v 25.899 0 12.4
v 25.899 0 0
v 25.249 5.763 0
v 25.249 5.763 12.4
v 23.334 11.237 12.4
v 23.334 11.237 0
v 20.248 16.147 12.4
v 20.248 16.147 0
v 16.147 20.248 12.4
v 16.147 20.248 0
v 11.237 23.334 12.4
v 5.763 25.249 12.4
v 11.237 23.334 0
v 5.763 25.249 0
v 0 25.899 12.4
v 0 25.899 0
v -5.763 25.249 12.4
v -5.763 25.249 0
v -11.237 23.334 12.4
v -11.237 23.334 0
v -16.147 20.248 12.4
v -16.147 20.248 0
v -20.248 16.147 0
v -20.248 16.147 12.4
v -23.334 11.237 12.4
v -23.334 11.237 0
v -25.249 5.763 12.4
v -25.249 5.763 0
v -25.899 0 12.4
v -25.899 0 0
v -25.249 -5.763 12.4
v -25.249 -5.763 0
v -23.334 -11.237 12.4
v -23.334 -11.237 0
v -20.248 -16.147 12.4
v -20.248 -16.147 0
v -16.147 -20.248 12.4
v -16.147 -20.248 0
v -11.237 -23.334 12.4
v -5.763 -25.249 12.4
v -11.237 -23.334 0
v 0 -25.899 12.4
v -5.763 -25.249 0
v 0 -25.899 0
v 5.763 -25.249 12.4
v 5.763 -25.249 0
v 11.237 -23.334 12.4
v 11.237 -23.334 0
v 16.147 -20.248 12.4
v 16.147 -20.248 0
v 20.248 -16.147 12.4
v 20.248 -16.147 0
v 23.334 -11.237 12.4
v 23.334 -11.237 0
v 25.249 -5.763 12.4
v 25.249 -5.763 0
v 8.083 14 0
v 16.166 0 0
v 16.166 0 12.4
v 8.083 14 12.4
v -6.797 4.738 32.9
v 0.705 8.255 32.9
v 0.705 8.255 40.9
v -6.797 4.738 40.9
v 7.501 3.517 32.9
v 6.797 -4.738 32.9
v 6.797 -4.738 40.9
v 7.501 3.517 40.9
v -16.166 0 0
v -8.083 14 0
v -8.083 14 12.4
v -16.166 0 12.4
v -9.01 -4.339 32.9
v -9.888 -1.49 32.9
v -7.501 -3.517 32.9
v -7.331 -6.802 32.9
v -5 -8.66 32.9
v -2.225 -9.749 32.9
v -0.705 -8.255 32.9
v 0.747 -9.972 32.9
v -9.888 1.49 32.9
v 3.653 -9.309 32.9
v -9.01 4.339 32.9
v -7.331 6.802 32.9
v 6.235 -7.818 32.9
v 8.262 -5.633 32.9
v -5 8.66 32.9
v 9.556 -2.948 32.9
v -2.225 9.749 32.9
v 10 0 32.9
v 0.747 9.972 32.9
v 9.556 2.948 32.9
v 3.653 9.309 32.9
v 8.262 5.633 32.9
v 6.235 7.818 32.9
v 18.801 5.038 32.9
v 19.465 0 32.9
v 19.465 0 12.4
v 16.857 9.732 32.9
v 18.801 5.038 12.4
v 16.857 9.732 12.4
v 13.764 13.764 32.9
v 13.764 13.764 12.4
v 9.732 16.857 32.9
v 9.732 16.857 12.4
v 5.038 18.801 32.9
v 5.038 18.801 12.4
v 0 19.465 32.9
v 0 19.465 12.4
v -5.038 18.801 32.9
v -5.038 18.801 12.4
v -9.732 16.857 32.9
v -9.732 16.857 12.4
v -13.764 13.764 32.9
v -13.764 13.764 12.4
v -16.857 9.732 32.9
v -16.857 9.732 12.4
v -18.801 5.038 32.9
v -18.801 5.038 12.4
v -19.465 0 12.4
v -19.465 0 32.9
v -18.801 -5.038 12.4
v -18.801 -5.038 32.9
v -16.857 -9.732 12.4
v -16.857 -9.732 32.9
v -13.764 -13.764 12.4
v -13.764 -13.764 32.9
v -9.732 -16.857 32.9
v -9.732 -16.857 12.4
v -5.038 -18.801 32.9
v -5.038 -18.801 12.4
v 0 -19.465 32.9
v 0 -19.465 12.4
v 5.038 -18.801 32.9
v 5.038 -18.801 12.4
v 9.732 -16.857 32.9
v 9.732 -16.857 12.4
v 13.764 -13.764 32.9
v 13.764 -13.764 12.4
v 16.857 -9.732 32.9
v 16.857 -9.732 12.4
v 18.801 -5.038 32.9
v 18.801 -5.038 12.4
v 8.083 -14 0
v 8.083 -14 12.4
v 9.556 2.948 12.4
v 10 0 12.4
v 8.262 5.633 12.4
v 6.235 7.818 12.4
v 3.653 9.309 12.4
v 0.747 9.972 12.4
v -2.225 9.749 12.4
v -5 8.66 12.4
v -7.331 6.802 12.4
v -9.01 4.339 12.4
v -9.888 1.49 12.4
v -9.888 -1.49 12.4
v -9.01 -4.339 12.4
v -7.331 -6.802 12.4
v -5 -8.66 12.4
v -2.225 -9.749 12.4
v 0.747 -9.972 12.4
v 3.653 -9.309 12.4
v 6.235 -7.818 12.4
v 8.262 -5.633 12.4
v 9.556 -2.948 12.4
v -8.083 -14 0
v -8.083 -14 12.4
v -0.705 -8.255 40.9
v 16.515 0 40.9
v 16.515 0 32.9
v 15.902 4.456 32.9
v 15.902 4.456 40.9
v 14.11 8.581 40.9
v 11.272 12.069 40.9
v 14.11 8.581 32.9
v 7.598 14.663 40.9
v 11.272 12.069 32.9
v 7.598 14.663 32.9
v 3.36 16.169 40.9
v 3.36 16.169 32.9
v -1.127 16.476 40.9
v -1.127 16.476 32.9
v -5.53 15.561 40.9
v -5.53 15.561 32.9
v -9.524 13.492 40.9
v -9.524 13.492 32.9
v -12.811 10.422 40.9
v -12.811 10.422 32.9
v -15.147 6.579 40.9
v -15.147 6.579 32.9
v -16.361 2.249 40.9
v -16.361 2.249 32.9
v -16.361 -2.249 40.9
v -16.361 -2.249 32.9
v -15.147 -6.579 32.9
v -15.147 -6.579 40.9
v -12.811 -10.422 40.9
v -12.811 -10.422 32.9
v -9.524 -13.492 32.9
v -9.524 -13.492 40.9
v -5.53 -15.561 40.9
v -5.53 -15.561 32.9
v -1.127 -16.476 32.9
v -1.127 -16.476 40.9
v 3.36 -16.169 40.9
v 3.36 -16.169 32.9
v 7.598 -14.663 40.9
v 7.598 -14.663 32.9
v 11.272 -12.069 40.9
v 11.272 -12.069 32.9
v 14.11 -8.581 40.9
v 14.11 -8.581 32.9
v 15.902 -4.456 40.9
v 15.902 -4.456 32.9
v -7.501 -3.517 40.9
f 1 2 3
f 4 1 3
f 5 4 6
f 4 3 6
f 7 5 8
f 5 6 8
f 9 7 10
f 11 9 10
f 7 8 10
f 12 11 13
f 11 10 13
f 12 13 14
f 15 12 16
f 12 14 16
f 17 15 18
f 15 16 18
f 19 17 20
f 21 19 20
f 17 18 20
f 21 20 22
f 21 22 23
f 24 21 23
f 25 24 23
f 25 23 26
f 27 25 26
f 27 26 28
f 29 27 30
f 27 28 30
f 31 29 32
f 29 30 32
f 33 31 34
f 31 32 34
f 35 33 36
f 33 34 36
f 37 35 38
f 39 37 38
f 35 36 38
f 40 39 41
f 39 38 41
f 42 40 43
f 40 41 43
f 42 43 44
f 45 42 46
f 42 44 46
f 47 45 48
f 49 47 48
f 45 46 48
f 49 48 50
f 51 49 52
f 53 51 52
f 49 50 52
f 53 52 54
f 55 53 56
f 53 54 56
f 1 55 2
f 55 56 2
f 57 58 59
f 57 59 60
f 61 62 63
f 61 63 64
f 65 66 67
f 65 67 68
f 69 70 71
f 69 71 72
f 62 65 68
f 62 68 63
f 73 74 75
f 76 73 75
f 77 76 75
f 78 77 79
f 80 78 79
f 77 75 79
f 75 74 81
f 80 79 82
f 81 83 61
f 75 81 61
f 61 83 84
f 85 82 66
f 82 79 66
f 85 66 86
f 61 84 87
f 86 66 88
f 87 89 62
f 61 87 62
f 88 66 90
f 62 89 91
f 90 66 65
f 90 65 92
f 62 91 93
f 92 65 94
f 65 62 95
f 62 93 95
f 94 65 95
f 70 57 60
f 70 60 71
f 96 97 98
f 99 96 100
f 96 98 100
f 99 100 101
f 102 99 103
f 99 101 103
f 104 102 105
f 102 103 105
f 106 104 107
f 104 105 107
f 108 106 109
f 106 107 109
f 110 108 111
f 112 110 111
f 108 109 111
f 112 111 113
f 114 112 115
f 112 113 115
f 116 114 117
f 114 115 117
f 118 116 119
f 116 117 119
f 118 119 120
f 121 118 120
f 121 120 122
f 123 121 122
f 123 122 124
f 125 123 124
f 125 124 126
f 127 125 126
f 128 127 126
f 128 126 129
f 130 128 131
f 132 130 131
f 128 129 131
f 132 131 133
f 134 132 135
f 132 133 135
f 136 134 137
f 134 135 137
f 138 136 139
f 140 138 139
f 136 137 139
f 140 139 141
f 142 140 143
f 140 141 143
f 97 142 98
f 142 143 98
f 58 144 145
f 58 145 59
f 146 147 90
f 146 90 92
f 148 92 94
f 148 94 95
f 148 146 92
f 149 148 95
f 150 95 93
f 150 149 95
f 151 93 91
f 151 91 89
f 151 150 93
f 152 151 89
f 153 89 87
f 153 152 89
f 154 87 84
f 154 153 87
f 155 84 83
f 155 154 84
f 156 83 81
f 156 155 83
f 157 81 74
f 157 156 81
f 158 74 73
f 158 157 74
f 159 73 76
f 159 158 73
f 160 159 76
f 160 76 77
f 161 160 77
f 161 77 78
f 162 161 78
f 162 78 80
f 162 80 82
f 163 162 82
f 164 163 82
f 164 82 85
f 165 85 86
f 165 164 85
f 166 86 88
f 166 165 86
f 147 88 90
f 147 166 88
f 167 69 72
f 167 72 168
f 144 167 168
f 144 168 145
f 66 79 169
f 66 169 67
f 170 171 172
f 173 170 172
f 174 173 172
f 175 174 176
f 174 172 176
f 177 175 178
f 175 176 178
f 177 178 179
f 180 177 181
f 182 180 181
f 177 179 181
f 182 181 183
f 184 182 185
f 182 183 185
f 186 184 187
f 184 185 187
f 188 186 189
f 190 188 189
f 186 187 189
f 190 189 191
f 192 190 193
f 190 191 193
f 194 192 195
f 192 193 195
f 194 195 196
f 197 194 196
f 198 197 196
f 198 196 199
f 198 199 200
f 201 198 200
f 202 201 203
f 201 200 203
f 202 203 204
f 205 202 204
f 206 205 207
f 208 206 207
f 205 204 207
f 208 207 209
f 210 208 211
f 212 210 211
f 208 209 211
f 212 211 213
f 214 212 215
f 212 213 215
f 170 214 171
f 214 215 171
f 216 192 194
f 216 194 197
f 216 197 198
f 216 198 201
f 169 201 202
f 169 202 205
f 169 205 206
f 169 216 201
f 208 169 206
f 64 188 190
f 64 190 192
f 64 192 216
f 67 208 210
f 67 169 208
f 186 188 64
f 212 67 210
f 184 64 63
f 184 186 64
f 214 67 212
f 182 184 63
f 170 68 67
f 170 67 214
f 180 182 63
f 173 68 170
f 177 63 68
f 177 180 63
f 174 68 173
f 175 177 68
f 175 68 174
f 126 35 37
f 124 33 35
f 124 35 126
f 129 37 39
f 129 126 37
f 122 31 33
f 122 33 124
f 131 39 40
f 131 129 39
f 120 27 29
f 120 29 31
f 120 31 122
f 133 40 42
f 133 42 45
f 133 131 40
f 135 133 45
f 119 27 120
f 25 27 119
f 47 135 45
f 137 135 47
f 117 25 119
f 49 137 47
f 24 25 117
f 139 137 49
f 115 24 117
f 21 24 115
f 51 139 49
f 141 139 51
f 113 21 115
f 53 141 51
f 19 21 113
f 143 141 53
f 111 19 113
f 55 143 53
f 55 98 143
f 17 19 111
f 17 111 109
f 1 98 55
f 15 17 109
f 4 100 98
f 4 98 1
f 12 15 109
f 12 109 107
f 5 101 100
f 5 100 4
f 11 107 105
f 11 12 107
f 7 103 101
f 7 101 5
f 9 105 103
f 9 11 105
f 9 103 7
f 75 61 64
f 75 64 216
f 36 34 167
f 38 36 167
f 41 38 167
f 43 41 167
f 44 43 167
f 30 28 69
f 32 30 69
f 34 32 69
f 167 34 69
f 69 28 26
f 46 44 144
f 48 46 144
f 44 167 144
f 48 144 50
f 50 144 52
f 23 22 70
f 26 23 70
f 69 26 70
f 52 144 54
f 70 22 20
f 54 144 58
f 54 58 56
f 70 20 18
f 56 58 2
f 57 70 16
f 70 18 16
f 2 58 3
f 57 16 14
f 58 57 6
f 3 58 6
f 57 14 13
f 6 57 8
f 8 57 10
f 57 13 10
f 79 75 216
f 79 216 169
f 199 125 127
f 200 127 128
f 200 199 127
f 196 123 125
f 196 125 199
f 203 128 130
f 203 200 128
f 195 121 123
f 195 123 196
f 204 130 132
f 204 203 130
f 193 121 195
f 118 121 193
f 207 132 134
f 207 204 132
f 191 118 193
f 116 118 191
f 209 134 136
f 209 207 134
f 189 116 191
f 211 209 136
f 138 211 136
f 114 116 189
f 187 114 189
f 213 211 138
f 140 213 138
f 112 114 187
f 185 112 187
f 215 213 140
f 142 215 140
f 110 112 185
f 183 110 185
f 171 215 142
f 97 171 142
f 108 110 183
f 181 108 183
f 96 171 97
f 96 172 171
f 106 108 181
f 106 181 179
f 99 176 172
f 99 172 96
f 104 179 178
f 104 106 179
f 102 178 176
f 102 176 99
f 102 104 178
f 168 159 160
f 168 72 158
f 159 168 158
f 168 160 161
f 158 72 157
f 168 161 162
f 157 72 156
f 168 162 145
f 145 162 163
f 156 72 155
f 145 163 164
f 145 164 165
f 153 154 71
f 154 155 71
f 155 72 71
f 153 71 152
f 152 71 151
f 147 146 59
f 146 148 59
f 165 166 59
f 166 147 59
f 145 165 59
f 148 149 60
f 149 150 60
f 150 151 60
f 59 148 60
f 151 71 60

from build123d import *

# Parameters (mm, degrees)
SKETCH_R      = 25.898575
PAD_DEPTH     = 12.4
SKETCH001_R   = 19.464616
SKETCH001_R_2 = 10
PAD001_DEPTH  = 20.5
SKETCH002_R   = 16.514521
PAD002_DEPTH  = 8


with BuildPart() as part:
    # Sketch → Pad (new body)
    with BuildSketch(Plane.XY):
        Circle(SKETCH_R)
        Polygon((8.082904, 14), (-8.082904, 14), (-16.165808, 0), (-8.082904, -14), (8.082904, -14), (16.165808, 0), align=None, mode=Mode.SUBTRACT)
    extrude(amount=PAD_DEPTH)

    # Sketch001 (on Face9 of Pad) → Pad001 (join)
    with BuildSketch(Plane.XY.offset(12.4)):
        Circle(SKETCH001_R)
        Circle(SKETCH001_R_2, mode=Mode.SUBTRACT)
    extrude(amount=PAD001_DEPTH)

    # Sketch002 (on Face12 of Pad001) → Pad002 (join)
    with BuildSketch(Plane.XY.offset(32.9)):
        Circle(SKETCH002_R)
        Polygon((-6.796552, 4.737901), (-7.501419, -3.517036), (-0.704867, -8.254938), (6.796552, -4.737901), (7.501419, 3.517036), (0.704867, 8.254938), align=None, mode=Mode.SUBTRACT)
    extrude(amount=PAD002_DEPTH)


solid = part.part
